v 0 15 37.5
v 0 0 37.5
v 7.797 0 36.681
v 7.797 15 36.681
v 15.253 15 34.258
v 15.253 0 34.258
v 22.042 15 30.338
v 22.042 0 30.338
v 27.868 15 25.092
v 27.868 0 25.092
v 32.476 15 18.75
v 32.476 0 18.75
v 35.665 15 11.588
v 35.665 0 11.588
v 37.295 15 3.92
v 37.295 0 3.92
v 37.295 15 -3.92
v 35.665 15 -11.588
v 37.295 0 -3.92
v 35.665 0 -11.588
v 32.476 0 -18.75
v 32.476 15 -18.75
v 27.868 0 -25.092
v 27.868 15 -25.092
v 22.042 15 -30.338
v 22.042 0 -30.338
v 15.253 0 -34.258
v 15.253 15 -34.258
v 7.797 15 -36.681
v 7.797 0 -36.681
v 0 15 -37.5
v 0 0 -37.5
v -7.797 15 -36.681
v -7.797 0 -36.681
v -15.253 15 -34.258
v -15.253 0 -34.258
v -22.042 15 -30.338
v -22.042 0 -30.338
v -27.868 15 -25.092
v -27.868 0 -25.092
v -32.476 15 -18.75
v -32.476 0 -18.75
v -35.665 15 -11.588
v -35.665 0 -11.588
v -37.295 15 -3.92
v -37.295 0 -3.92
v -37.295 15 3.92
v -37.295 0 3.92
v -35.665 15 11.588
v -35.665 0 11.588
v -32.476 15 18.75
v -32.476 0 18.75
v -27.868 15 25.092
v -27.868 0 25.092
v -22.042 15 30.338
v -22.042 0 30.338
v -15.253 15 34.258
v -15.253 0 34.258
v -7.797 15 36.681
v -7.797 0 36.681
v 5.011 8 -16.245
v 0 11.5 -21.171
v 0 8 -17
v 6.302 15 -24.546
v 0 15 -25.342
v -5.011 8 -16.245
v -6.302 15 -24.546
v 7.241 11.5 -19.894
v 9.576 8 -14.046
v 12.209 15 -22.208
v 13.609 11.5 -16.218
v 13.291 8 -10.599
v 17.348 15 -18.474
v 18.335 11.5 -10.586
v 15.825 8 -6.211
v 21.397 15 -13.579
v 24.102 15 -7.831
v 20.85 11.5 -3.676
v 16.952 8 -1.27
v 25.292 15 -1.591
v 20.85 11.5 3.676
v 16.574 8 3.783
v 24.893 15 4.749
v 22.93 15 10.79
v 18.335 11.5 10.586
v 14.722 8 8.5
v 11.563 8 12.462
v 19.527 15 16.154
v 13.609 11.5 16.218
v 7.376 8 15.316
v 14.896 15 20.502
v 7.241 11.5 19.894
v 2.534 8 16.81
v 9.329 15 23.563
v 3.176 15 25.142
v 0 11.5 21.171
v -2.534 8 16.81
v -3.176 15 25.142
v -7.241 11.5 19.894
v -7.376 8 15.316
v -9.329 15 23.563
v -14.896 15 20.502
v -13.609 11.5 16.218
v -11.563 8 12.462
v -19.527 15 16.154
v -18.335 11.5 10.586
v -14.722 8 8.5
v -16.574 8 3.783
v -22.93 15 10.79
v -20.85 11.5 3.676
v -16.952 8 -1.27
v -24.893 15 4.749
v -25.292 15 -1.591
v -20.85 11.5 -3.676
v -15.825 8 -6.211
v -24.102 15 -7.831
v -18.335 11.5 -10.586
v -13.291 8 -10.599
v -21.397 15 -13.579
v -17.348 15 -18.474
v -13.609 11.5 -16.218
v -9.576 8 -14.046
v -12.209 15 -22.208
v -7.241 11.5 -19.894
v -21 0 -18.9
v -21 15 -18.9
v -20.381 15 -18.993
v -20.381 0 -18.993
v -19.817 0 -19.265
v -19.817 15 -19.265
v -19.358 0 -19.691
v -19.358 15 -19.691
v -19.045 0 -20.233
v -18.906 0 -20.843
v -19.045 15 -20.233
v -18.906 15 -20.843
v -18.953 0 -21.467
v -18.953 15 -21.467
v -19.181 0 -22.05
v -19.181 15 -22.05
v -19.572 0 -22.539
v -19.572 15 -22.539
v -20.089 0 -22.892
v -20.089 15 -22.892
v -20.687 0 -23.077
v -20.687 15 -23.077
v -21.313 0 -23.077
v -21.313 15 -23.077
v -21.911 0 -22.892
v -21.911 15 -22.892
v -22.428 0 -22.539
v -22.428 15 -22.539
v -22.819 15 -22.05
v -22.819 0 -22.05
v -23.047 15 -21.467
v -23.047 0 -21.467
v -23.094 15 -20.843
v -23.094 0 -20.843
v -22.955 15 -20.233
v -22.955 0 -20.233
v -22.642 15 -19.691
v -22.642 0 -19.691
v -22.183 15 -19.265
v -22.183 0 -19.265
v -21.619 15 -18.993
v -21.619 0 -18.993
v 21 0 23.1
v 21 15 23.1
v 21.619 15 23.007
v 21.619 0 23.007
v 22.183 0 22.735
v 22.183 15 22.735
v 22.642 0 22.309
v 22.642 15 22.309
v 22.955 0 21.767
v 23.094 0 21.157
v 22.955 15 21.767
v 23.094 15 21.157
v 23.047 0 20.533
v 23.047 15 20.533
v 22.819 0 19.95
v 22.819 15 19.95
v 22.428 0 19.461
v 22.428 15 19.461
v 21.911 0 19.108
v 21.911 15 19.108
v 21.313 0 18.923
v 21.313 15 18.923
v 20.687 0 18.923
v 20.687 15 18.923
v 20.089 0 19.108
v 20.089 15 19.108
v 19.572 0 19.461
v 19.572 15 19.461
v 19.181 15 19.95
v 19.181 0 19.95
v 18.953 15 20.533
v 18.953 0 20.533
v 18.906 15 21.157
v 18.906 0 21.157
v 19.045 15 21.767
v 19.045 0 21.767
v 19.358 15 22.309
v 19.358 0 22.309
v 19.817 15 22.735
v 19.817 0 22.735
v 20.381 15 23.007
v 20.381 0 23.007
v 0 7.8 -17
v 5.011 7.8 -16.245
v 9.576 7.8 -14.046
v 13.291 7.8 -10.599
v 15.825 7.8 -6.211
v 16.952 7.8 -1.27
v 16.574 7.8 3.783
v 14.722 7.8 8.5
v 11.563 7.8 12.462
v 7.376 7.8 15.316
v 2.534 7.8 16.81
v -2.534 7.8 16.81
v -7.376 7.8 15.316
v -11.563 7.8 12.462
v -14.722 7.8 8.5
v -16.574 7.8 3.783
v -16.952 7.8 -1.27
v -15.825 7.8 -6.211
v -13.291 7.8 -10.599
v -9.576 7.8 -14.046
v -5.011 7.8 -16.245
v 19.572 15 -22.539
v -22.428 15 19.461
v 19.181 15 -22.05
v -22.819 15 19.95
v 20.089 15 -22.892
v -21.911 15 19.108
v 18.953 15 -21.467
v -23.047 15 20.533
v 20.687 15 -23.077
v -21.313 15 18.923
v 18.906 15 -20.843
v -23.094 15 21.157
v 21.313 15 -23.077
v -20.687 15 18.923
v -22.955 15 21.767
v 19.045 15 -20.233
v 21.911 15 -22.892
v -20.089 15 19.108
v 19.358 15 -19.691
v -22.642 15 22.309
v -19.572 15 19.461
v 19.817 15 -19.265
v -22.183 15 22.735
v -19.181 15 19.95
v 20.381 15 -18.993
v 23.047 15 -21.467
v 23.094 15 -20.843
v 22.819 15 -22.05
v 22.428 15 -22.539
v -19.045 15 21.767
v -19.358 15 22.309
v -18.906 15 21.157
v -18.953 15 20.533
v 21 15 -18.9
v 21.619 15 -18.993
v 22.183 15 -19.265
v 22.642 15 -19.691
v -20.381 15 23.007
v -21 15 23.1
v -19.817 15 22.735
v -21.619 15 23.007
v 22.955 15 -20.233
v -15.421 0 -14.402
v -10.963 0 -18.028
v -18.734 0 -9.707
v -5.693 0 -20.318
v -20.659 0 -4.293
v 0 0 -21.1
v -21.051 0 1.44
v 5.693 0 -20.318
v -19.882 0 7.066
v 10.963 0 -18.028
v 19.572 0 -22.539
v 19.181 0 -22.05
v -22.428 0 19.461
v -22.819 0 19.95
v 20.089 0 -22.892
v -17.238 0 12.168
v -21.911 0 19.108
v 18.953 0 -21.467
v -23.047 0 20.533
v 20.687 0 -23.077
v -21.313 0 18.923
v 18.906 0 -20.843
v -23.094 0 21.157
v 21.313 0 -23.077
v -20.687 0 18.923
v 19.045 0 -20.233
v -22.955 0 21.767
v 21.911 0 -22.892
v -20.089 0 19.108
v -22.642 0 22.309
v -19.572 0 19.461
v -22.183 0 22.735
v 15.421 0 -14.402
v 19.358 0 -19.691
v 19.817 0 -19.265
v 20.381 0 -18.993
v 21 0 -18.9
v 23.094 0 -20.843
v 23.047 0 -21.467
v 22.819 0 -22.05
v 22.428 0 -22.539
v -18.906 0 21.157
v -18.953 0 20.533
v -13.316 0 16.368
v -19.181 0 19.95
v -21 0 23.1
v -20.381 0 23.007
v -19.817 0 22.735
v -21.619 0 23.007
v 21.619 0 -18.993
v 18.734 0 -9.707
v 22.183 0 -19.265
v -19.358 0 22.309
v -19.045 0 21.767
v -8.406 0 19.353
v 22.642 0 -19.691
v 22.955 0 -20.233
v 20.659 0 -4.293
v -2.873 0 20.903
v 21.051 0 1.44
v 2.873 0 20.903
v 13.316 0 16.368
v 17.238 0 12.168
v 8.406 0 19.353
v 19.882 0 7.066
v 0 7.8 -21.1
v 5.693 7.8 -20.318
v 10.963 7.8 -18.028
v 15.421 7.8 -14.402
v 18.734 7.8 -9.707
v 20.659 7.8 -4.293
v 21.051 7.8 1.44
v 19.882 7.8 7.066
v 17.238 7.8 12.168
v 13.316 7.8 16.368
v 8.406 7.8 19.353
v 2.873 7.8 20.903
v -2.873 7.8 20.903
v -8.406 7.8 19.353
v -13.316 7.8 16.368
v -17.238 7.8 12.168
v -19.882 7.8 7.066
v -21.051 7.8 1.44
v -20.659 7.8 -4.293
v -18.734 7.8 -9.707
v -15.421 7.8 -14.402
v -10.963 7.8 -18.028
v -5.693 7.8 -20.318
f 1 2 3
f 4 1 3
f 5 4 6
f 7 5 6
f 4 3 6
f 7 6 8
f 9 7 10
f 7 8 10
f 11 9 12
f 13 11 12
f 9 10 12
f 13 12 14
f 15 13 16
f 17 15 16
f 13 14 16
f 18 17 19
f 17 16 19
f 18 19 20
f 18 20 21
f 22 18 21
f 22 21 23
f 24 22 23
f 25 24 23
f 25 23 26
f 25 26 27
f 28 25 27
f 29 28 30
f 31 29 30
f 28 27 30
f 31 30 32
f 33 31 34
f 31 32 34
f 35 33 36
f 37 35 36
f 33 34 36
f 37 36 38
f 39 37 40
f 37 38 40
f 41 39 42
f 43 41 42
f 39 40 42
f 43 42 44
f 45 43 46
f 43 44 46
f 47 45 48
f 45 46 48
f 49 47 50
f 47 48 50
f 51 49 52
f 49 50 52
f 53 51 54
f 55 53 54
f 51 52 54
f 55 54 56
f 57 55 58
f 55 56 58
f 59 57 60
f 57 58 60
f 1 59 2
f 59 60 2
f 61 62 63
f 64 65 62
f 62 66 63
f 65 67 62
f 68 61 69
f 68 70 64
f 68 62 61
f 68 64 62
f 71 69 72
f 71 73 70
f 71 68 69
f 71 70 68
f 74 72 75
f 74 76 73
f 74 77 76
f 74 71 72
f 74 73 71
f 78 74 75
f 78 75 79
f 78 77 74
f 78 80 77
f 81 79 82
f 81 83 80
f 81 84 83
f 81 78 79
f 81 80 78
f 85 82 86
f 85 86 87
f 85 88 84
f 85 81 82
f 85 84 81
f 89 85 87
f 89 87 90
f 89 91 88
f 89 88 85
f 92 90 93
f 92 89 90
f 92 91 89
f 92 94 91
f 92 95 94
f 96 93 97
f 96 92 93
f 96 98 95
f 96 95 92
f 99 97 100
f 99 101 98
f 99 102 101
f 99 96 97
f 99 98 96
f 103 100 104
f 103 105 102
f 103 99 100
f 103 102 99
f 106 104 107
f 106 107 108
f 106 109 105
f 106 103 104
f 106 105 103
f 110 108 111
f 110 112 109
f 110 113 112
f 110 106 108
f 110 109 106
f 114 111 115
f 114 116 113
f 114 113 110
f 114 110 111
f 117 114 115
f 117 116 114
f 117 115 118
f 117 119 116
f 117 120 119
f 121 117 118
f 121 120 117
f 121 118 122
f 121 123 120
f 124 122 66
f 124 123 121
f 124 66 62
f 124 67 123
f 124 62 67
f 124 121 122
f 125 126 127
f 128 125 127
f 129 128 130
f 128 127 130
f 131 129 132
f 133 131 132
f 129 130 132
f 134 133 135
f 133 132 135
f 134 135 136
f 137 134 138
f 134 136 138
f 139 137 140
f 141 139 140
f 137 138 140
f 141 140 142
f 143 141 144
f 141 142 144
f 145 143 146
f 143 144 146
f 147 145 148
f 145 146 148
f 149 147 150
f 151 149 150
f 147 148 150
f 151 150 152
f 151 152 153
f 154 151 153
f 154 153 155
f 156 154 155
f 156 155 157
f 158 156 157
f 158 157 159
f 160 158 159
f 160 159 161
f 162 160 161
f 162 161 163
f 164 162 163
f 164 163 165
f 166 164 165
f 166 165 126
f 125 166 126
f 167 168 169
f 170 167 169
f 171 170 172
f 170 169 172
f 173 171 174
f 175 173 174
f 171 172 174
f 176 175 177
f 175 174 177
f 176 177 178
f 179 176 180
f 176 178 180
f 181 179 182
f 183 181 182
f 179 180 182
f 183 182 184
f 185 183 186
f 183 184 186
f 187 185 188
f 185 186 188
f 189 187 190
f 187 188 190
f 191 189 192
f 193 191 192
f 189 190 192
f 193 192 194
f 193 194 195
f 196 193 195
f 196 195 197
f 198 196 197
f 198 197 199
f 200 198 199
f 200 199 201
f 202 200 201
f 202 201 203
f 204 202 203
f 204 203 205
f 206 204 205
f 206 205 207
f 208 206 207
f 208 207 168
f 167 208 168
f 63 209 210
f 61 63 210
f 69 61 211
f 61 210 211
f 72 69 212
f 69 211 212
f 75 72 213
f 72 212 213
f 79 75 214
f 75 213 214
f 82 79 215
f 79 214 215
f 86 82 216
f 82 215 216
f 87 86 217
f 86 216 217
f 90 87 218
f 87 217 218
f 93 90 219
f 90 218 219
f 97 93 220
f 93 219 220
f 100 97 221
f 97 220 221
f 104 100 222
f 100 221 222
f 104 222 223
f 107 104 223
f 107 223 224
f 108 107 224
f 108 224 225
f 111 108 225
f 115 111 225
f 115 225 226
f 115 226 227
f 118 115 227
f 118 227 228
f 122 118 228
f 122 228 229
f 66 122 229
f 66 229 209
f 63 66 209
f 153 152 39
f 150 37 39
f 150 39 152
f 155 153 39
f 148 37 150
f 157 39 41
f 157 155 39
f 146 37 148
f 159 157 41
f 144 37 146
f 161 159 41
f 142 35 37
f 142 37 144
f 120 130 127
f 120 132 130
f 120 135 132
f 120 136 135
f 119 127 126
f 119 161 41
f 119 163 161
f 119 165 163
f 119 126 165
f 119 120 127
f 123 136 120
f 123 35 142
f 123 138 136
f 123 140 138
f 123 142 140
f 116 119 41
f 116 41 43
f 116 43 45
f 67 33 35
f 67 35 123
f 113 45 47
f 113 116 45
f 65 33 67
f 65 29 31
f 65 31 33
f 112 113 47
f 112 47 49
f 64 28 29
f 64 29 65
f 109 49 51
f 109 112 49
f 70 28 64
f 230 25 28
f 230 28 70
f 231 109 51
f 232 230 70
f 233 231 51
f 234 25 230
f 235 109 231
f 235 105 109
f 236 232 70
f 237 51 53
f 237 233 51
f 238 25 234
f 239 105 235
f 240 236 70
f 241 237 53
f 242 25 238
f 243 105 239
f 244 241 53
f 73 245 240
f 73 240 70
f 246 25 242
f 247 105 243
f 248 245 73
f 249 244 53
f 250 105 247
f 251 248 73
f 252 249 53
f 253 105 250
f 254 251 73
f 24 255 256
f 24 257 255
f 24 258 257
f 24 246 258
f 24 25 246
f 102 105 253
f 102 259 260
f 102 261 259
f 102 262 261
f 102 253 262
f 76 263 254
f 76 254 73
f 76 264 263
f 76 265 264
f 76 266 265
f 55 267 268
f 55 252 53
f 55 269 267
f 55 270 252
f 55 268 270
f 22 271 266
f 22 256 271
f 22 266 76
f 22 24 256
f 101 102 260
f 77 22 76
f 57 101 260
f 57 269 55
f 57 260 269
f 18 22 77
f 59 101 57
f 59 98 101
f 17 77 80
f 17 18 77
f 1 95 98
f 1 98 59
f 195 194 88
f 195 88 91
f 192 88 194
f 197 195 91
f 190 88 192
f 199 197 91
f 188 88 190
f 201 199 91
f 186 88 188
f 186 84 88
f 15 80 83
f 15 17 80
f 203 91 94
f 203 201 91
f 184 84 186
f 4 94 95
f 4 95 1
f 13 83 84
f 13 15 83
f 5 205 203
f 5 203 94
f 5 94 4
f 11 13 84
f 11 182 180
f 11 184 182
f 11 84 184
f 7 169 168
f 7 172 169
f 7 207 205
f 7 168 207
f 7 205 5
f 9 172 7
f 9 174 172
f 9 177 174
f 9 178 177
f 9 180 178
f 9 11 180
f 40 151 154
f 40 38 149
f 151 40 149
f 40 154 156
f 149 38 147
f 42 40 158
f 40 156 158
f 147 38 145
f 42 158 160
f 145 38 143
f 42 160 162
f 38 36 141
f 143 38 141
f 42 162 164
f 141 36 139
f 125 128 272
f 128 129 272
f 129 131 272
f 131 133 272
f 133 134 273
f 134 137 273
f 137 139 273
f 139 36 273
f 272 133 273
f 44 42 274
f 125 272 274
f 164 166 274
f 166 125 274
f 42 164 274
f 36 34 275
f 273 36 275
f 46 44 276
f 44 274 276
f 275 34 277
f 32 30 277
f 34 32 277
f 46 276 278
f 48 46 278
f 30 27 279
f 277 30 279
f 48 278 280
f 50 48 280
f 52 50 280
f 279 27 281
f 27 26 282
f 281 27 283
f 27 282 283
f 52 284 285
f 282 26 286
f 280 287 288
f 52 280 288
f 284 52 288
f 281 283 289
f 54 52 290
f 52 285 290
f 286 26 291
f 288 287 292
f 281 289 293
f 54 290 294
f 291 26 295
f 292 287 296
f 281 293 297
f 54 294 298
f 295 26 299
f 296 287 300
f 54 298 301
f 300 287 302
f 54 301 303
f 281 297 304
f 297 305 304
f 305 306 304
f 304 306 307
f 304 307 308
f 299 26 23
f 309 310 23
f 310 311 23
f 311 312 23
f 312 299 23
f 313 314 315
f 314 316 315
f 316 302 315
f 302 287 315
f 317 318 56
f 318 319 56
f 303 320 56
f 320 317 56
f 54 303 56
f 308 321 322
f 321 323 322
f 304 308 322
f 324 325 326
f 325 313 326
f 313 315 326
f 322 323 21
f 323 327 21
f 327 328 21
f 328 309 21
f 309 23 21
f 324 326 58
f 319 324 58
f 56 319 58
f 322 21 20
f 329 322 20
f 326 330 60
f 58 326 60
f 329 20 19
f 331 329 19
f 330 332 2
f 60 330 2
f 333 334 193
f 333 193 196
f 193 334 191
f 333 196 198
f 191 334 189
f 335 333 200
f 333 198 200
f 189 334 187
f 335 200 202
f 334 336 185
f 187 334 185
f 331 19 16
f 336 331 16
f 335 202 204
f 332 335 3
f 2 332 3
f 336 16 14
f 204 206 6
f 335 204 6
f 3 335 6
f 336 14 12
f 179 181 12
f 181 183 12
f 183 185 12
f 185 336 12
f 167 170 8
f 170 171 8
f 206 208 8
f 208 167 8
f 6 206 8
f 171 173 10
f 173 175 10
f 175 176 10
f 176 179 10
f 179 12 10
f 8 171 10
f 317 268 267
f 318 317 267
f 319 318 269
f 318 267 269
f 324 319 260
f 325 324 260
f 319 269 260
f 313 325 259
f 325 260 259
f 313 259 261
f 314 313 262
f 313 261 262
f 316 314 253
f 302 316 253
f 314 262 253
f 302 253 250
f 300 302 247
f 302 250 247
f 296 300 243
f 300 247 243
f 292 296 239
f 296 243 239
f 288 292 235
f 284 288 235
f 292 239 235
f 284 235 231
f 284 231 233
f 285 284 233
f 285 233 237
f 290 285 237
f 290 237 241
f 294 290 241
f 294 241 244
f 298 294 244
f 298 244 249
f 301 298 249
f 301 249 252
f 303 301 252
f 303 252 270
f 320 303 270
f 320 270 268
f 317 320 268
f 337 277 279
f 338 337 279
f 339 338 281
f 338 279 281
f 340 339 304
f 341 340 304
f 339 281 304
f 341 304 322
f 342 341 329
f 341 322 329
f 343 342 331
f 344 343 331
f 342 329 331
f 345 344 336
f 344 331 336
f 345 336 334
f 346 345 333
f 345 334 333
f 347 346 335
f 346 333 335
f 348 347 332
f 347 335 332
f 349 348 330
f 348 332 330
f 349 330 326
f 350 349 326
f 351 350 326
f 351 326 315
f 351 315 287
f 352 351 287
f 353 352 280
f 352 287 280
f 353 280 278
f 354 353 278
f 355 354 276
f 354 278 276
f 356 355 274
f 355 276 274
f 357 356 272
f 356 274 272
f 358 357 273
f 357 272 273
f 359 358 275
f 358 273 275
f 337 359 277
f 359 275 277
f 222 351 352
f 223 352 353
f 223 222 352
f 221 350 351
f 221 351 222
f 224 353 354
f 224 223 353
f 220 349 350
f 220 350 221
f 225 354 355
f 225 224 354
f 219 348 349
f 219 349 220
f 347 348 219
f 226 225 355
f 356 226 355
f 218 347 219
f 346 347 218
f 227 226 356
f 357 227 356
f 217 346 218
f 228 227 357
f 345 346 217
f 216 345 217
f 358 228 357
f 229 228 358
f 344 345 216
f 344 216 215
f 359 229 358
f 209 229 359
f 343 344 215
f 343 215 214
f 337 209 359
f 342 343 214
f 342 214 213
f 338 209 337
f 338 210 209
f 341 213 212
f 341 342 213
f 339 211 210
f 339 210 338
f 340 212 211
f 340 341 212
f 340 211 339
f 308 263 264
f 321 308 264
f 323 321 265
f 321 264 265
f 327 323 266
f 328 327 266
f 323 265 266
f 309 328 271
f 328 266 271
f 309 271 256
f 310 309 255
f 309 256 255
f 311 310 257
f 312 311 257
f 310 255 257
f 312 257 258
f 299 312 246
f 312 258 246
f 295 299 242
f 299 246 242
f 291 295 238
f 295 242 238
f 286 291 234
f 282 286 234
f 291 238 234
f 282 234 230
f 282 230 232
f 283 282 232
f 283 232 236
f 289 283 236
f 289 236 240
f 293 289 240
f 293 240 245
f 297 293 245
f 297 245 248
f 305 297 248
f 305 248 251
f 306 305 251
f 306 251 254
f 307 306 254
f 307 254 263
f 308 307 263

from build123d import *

# Parameters (mm, degrees)
SKETCH1_R           = 37.5
BOSS_EXTRUDE1_DEPTH = 15
SKETCH2_R           = 21.1
CUT_EXTRUDE1_DEPTH  = 7.8
SKETCH3_R           = 17
CUT_EXTRUDE2_DEPTH  = 8.2
SKETCH4_R           = 2.1
CUT_EXTRUDE3_DEPTH  = 16
CHAMFER1_SIZE       = 7
CHAMFER1_SIZE2      = 8.342275148


with BuildPart() as part:
    # Sketch1 → Boss-Extrude1 (new body)
    with BuildSketch(Plane(origin=(0, 0, 0), x_dir=(1, 0, 0), z_dir=(0, 1, 0))):
        with Locations(Location((0, 0, 0), (0, 0, 270))):  # turned: the seam where the file's is
            Circle(SKETCH1_R)
    extrude(amount=BOSS_EXTRUDE1_DEPTH)

    # Sketch2 → Cut-Extrude1 (cut)
    with BuildSketch(Plane.XZ):
        with Locations(Location((0, 0, 0), (0, 0, 270))):  # turned: the seam where the file's is
            Circle(SKETCH2_R)
    extrude(amount=-CUT_EXTRUDE1_DEPTH, mode=Mode.SUBTRACT)

    # Sketch3 → Cut-Extrude2 (cut, through all)
    with BuildSketch(Plane.XZ.offset(-7.8)):
        with Locations(Location((0, 0, 0), (0, 0, 270))):  # turned: the seam where the file's is
            Circle(SKETCH3_R)
    extrude(amount=-CUT_EXTRUDE2_DEPTH, mode=Mode.SUBTRACT)

    # Sketch4 → Cut-Extrude3 (cut, through all)
    with BuildSketch(Plane(origin=(0, 15, 0), x_dir=(1, 0, 0), z_dir=(0, 1, 0))):
        with Locations(Location((-21, -21, 0), (0, 0, 270))):  # turned: the seam where the file's is
            Circle(SKETCH4_R)
        with Locations(Location((-21, 21, 0), (0, 0, 270))):  # turned: the seam where the file's is
            Circle(SKETCH4_R)
        with Locations(Location((21, 21, 0), (0, 0, 270))):  # turned: the seam where the file's is
            Circle(SKETCH4_R)
        with Locations(Location((21, -21, 0), (0, 0, 270))):  # turned: the seam where the file's is
            Circle(SKETCH4_R)
    extrude(amount=-CUT_EXTRUDE3_DEPTH, mode=Mode.SUBTRACT)

    # Chamfer1
    chamfer1_edges = [part.edges().sort_by_distance(p)[0] for p in [
        (0, 15, 17),
    ]]
    chamfer1_side = [part.faces().sort_by_distance(p)[0] for p in [
        (0, 11.4, 17),
    ]]
    chamfer(chamfer1_edges, length=CHAMFER1_SIZE, length2=CHAMFER1_SIZE2, reference=chamfer1_side[0])


solid = part.part
